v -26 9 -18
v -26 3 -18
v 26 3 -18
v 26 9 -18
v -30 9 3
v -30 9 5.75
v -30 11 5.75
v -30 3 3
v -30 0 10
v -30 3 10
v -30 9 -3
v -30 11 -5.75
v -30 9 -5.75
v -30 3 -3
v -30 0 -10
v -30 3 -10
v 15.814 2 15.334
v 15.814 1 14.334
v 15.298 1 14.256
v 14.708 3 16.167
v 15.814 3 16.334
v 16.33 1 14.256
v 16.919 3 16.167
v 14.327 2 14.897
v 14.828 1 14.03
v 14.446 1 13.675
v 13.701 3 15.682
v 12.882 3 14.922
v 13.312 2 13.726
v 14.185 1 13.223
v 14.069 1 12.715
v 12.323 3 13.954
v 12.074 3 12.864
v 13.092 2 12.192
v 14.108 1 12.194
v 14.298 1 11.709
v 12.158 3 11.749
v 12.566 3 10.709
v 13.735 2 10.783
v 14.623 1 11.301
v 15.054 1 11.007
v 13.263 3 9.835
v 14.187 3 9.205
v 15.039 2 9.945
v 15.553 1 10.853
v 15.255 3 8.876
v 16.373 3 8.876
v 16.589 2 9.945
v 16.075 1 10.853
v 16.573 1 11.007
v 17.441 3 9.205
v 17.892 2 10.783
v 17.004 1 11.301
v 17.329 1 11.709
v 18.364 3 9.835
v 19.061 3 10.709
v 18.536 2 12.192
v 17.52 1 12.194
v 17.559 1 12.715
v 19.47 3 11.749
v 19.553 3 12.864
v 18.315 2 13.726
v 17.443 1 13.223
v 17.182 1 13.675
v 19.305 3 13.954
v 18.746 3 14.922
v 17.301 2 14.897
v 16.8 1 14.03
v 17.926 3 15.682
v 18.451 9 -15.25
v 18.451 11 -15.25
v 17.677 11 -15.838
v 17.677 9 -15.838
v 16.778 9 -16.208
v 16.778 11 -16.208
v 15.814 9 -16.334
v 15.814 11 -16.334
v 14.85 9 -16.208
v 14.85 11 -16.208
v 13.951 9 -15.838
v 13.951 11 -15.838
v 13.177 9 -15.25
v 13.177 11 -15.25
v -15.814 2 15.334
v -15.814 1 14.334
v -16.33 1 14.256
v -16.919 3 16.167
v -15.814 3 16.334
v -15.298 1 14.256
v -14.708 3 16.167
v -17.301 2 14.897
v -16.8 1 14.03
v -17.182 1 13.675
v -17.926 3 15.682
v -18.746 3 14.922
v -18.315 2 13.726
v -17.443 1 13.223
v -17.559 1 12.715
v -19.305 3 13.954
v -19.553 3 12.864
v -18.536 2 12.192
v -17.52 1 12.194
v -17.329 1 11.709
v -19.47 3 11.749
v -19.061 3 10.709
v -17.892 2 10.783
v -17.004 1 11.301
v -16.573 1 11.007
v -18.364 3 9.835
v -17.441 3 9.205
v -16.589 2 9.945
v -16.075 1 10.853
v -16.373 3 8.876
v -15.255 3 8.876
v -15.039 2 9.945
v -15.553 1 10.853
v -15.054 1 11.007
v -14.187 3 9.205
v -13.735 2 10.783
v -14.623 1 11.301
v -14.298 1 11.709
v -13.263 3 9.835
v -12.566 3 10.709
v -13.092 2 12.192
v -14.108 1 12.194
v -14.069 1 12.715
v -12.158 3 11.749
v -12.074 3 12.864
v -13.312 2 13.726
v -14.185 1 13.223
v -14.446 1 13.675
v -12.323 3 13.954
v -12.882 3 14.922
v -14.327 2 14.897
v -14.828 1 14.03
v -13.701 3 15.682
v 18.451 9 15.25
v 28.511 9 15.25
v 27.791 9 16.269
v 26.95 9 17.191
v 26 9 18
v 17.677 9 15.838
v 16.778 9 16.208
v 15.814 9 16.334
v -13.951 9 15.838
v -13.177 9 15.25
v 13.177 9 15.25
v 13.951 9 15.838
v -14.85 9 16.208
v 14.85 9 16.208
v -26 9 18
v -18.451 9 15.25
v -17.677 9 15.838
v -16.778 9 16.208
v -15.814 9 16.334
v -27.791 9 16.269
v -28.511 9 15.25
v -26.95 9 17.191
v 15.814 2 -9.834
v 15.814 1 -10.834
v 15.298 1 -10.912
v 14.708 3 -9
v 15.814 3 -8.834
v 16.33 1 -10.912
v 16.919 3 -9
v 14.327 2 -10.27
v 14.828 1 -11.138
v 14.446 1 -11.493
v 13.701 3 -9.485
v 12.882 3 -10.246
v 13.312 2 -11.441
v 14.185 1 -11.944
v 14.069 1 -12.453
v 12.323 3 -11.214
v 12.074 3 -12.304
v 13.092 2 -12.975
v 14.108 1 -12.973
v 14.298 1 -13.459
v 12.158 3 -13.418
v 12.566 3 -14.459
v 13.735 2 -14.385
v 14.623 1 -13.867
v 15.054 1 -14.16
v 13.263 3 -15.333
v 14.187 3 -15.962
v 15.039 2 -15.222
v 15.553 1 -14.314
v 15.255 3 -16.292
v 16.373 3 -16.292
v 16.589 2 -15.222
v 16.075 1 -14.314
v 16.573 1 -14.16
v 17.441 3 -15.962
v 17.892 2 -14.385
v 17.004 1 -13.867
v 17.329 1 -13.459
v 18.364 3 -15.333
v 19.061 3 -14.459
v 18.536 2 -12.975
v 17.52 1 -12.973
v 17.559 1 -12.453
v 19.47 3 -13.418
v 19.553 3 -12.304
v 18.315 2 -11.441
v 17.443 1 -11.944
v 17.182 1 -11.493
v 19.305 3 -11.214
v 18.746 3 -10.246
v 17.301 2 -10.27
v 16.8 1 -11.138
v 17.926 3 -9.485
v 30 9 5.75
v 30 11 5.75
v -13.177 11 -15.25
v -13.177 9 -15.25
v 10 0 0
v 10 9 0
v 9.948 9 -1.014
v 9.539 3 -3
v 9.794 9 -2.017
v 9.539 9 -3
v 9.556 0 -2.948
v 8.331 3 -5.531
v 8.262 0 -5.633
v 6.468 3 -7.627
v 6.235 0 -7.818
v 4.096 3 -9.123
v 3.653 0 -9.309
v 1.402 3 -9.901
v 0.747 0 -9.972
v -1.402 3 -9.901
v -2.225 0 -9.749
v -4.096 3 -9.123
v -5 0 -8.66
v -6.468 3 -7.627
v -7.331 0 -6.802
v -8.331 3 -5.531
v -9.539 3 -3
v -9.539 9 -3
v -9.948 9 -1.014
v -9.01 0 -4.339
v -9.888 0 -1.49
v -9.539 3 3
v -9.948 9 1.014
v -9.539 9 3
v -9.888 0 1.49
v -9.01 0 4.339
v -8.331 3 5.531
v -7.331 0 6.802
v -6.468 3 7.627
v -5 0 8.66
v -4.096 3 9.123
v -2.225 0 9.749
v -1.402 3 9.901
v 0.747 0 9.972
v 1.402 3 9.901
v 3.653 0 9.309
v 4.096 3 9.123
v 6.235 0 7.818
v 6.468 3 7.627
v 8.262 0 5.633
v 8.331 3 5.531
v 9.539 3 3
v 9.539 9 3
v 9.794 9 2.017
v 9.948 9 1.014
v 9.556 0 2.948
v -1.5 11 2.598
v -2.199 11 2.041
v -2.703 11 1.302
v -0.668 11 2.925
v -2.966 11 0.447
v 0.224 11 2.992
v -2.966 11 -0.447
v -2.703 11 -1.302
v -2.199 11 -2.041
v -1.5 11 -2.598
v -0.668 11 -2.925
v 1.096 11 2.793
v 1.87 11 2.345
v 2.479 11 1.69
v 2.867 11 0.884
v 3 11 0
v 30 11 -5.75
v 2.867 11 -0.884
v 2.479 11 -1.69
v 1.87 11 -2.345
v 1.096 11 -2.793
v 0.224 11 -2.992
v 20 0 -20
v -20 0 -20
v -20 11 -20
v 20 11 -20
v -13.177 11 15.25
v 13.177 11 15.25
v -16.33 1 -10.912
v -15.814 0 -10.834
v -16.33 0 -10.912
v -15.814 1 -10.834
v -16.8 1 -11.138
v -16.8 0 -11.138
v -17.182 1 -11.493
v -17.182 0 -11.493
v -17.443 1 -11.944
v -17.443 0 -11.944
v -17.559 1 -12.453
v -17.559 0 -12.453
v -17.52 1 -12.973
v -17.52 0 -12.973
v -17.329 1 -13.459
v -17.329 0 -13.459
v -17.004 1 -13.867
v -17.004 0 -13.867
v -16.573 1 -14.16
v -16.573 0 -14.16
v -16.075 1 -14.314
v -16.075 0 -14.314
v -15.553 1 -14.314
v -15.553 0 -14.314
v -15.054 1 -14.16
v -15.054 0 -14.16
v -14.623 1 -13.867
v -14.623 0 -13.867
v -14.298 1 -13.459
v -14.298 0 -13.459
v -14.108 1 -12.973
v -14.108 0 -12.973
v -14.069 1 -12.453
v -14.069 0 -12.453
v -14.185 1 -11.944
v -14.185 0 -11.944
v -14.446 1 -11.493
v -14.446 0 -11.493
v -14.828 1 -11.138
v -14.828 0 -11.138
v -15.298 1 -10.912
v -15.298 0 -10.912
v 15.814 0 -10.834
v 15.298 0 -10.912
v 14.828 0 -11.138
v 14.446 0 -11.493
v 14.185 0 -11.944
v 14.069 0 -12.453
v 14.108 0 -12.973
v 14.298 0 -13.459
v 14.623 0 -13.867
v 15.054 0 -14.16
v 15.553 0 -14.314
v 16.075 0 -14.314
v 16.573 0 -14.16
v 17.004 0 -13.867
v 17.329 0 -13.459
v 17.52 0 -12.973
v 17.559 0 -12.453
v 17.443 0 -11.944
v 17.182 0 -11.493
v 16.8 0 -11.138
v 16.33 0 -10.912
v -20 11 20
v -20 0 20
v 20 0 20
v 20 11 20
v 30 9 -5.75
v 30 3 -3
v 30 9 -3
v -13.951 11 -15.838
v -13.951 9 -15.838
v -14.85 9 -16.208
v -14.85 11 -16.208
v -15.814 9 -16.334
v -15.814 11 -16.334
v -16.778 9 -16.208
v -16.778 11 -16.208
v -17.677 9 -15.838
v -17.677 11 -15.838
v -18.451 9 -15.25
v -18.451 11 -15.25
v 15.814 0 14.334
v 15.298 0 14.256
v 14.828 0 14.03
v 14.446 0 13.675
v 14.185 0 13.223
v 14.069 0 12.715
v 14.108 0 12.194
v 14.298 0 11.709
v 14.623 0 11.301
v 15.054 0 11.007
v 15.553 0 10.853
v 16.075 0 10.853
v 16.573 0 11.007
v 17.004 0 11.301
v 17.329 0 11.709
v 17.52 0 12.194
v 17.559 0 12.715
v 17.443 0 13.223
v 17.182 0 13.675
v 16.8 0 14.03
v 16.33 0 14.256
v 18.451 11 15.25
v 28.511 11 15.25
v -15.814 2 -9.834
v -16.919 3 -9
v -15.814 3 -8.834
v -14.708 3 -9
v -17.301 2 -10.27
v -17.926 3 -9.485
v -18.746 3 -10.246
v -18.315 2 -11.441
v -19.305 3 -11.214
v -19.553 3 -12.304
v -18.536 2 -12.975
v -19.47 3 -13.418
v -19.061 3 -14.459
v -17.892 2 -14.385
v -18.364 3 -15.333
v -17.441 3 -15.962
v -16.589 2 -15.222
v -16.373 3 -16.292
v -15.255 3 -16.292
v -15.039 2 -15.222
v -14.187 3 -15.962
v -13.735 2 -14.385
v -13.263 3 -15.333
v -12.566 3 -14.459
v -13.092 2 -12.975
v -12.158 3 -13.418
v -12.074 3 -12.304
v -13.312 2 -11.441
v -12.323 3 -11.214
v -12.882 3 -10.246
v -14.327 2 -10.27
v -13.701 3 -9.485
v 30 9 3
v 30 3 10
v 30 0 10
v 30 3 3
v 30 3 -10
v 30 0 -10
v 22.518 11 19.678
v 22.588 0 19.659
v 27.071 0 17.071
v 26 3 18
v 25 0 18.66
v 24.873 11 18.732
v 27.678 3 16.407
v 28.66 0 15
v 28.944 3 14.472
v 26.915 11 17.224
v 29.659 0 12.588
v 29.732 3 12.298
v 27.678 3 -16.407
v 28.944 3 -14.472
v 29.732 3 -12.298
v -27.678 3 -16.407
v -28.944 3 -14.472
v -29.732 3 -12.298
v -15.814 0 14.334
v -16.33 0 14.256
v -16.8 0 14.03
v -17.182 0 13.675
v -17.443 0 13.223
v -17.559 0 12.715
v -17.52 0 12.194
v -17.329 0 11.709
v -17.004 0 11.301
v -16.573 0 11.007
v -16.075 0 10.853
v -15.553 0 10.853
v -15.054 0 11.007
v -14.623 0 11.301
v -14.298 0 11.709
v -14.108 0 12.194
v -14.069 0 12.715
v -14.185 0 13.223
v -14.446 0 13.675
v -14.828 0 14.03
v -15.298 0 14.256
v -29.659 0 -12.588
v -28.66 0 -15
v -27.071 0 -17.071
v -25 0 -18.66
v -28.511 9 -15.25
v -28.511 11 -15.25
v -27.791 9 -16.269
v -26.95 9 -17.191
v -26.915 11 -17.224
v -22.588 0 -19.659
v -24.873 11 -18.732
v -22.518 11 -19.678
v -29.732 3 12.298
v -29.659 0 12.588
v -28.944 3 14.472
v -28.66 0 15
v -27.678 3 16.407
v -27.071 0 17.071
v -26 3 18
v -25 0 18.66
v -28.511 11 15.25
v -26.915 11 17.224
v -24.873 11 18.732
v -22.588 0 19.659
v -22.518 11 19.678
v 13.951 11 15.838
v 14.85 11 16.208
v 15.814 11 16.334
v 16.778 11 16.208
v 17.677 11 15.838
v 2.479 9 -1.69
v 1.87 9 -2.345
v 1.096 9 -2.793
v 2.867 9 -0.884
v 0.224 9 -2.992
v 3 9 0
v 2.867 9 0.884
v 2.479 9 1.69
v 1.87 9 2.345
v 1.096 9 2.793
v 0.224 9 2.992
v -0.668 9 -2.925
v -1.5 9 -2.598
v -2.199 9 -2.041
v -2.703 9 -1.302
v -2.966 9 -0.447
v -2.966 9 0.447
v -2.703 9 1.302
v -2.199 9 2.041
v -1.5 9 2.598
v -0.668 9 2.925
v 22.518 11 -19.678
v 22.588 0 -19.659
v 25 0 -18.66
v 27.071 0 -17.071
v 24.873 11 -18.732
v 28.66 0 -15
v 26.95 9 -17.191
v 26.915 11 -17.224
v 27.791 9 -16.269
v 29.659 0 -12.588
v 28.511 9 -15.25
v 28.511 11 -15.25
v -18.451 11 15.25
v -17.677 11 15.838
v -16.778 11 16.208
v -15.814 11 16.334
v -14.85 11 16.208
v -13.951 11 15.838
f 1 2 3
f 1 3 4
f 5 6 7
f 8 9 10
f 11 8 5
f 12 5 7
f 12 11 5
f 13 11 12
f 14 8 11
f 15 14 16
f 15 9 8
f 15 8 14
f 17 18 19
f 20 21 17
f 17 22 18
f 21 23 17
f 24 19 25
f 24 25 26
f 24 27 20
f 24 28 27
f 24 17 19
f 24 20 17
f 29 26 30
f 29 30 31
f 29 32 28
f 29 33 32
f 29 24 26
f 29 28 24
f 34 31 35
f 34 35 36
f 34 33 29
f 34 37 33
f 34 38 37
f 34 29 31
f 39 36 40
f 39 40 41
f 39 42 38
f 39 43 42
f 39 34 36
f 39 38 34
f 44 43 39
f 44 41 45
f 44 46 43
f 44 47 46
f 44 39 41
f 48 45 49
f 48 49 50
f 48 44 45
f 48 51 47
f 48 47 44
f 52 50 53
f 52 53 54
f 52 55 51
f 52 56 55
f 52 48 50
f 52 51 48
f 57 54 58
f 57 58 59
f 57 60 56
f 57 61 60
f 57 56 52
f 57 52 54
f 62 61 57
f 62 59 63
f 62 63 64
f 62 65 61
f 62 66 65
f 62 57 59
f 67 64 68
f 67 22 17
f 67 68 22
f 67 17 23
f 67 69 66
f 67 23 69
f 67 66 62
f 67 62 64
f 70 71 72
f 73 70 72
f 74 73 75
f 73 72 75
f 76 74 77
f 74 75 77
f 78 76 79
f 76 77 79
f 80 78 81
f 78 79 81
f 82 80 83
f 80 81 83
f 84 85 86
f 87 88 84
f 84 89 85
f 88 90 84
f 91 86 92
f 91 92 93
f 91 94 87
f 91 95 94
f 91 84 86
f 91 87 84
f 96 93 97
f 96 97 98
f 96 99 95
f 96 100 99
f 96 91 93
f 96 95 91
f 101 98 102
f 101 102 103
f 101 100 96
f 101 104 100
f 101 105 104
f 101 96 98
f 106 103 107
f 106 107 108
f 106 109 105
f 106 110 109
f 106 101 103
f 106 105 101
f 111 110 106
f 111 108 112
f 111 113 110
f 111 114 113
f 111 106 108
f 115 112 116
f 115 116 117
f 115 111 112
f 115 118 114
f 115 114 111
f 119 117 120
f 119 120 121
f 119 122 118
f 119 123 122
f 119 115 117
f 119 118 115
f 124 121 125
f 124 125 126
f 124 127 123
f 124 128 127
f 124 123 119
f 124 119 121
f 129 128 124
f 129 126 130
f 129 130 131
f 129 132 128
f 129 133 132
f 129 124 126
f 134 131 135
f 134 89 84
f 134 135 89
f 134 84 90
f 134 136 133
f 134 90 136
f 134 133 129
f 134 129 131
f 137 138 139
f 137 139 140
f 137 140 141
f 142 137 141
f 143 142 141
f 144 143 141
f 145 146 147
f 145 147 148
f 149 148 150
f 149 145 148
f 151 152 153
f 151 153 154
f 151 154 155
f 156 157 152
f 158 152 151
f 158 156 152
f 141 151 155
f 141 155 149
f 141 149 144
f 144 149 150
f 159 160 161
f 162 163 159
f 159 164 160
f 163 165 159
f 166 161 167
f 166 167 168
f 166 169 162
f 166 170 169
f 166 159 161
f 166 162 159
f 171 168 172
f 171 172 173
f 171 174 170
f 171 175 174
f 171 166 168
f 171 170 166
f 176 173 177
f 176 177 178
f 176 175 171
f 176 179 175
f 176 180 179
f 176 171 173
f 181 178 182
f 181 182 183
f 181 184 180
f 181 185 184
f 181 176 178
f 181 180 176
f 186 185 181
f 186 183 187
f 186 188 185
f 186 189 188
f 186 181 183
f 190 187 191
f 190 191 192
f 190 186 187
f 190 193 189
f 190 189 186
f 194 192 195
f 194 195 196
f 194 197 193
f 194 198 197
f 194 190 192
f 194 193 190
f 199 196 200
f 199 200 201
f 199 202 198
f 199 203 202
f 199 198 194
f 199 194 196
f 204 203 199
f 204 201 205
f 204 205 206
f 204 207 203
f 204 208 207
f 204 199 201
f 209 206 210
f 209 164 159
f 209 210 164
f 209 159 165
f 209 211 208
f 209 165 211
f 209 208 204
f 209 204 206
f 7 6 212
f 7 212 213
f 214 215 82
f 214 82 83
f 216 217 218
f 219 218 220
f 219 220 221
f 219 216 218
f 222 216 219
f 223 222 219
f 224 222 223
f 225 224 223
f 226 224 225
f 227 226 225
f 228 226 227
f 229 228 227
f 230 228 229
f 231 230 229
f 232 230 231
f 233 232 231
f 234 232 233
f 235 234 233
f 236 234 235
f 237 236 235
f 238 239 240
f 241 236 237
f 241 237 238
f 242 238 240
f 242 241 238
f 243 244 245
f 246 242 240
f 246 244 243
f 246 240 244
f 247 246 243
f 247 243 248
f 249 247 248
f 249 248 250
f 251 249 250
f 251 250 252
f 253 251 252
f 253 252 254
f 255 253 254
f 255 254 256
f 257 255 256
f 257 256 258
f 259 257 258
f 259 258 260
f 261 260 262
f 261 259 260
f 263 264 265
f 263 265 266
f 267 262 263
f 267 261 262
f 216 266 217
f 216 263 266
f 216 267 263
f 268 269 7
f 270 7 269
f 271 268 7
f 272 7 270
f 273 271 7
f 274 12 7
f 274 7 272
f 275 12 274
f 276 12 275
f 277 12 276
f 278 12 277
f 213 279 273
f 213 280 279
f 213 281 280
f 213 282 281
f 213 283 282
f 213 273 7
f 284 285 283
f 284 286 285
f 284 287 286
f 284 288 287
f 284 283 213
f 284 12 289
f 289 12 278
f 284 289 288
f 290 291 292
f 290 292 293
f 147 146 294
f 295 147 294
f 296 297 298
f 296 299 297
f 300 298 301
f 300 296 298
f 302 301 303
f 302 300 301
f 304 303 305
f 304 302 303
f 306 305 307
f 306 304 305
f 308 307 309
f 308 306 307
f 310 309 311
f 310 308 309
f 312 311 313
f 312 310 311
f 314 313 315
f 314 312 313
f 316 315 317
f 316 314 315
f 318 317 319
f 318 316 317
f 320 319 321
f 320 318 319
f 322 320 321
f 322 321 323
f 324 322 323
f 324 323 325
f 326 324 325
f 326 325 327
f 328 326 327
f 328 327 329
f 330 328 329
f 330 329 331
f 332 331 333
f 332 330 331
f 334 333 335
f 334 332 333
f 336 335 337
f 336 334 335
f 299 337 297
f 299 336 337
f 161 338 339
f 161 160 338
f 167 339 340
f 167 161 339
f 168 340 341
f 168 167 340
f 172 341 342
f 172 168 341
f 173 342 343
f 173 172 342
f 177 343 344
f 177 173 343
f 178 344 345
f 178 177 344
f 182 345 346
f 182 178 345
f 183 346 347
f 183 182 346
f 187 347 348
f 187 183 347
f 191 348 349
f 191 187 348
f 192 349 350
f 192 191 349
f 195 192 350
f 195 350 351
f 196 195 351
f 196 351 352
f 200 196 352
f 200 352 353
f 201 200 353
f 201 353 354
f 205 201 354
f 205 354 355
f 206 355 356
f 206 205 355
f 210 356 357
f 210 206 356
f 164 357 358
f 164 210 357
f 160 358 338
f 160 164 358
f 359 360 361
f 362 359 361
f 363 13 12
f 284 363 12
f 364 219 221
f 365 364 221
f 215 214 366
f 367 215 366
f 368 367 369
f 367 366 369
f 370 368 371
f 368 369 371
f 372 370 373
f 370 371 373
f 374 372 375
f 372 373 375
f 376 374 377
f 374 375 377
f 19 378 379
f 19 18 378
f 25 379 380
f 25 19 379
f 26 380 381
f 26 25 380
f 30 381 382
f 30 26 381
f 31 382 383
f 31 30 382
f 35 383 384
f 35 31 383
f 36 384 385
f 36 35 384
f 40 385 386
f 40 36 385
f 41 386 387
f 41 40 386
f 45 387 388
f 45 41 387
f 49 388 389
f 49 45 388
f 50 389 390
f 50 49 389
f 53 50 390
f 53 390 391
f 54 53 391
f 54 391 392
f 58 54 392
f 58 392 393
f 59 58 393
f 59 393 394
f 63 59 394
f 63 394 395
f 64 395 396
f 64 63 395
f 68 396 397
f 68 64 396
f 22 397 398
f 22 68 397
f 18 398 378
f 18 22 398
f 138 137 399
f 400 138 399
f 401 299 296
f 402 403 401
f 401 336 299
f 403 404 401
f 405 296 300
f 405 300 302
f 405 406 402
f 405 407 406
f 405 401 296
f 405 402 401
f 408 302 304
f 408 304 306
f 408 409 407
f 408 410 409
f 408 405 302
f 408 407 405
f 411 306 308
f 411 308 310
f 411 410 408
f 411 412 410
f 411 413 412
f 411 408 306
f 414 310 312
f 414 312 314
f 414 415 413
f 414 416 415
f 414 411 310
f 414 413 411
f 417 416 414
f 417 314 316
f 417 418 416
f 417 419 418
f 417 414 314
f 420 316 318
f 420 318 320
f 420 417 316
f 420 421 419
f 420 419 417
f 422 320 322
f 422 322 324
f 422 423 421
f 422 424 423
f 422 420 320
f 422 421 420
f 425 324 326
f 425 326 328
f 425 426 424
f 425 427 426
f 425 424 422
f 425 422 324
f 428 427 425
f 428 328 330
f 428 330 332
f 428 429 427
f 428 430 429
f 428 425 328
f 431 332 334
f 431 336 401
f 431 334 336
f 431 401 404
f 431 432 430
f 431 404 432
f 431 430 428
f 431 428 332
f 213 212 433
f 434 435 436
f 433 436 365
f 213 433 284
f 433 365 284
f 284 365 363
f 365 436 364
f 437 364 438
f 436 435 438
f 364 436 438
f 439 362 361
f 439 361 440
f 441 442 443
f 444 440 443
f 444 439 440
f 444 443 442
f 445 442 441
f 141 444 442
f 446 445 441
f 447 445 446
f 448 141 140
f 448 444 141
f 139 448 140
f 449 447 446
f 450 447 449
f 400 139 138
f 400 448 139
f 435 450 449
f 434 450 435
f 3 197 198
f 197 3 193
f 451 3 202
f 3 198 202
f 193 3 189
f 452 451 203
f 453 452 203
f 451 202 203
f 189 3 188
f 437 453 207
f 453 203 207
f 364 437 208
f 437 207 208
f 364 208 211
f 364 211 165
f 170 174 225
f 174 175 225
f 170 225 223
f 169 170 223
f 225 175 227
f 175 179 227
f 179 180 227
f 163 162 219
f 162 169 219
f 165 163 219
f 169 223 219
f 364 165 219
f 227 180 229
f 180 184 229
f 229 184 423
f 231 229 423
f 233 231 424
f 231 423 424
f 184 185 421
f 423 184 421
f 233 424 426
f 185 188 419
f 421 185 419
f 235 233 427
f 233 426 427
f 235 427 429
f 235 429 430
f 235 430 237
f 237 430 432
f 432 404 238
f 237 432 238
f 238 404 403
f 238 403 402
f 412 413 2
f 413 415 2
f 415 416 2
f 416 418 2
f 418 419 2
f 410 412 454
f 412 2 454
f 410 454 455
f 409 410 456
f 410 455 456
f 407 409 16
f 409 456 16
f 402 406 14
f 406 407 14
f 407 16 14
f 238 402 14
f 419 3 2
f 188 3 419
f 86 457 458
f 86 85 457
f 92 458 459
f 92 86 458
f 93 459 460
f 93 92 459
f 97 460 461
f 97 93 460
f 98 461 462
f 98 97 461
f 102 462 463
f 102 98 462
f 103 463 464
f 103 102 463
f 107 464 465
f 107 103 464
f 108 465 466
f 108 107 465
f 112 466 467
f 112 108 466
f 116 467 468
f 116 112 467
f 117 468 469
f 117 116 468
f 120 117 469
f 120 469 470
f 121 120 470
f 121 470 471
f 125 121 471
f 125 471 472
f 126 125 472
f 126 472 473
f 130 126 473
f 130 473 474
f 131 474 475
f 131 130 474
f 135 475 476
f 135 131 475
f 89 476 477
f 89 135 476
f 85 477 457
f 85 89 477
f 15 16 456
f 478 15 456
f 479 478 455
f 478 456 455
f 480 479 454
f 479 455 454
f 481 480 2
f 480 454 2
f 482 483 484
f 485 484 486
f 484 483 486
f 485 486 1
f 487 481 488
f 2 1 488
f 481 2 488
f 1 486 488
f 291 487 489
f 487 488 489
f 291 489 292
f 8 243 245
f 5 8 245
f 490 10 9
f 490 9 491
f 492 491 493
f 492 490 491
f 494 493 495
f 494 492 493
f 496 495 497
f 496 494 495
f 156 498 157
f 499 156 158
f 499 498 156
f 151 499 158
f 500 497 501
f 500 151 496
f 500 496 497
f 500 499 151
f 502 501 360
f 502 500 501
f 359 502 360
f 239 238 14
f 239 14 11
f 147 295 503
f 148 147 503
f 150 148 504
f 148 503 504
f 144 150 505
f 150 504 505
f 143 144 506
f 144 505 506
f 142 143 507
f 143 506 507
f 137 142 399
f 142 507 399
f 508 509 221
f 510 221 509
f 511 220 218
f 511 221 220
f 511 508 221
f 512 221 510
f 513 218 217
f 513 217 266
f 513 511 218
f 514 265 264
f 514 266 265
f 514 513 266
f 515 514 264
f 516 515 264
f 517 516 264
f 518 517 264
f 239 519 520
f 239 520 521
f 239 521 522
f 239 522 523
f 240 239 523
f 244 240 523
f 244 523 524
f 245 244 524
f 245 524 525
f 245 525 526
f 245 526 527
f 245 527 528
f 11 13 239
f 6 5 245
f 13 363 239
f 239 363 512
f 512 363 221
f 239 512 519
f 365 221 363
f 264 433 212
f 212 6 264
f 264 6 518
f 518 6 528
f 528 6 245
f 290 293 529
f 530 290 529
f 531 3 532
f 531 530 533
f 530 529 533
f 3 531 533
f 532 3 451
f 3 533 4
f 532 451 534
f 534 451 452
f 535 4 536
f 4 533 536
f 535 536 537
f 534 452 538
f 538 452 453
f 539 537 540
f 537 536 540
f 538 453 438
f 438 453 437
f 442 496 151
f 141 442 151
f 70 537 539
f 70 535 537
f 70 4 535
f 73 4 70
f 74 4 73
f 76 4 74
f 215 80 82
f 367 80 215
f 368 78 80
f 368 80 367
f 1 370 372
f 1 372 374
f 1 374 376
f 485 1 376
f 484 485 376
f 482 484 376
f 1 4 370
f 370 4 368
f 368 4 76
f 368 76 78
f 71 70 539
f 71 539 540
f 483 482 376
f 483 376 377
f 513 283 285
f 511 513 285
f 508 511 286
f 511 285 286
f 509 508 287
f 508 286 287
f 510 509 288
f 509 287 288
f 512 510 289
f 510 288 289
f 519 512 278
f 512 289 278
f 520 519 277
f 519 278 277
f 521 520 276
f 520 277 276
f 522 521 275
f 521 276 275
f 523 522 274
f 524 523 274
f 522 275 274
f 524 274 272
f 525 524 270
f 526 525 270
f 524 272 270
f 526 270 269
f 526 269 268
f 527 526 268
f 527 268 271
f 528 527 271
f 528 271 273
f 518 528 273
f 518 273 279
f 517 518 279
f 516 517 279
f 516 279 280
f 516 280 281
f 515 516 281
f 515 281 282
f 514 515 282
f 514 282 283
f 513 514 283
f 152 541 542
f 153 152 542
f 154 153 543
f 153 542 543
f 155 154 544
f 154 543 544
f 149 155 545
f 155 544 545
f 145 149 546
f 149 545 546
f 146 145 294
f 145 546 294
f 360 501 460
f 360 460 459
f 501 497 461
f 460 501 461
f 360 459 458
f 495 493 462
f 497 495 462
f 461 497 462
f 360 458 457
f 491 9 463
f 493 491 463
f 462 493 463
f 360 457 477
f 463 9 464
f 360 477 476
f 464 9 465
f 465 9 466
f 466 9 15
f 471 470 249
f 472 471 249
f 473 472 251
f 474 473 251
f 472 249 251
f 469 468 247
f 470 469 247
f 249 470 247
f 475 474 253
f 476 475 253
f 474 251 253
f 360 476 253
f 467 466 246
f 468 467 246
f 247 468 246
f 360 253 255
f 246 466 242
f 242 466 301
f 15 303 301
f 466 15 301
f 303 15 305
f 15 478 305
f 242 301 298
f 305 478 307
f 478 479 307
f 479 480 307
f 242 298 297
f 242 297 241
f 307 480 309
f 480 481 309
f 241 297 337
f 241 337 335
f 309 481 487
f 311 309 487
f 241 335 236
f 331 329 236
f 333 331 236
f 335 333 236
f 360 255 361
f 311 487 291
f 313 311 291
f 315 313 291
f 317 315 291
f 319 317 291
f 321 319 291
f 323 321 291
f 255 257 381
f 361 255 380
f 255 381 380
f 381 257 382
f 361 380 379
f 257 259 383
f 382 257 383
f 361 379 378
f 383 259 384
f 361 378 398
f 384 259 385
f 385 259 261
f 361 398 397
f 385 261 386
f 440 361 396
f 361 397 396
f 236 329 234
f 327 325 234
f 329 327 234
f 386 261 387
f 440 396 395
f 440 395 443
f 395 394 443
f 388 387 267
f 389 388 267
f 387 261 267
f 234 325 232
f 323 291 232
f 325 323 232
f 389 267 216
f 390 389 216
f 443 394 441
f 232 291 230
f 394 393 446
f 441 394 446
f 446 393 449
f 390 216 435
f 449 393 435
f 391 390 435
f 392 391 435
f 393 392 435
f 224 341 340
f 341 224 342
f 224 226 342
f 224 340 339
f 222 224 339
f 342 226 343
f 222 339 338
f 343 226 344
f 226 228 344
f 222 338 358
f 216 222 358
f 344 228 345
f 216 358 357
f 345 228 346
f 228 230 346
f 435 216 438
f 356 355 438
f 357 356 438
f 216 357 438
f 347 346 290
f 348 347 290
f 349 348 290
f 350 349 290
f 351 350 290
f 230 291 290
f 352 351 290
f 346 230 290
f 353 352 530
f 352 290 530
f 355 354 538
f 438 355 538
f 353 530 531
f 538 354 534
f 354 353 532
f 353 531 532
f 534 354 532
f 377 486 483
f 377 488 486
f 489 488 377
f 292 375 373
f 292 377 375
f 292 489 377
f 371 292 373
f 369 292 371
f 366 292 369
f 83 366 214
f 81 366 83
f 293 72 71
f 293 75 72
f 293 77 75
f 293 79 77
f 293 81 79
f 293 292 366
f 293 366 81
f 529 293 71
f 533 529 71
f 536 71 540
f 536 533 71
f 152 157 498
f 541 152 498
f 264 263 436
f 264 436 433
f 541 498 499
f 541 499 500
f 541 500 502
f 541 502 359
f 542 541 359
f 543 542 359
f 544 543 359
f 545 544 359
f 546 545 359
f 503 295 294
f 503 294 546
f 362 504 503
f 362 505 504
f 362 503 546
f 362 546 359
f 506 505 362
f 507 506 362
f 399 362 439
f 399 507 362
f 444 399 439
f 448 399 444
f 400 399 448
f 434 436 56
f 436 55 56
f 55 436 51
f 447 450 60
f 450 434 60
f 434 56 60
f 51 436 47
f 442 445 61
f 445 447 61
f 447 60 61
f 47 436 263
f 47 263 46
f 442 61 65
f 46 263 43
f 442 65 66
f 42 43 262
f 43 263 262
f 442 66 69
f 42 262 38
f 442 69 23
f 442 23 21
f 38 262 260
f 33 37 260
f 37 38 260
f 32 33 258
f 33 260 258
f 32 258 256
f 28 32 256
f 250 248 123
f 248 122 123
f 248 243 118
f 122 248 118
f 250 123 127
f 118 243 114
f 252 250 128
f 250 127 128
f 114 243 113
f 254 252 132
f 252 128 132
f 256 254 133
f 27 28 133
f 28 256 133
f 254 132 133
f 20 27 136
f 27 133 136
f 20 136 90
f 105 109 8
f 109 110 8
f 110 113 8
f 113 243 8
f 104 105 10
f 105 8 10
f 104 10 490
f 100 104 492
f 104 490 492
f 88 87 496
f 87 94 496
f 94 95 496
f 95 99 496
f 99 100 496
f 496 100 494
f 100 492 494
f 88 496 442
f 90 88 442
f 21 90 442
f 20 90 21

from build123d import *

# Parameters (mm, degrees)
SKETCH1_W                                    = 60
SKETCH1_H                                    = 40
BOSS_EXTRUDE1_DEPTH                          = 11
SKETCH3_W                                    = 15
SKETCH3_H                                    = 6
SKETCH3_W_2                                  = 9.5
SKETCH3_H_2                                  = 2
CUT_EXTRUDE10_DEPTH                          = 61
CSK_FOR_M3_HEX_SOCKET_COUNTERSUNK_CA_2_COUNT = 2
CSK_FOR_M3_HEX_SOCKET_COUNTERSUNK_CA_2_PITCH = 25.167603026
CSK_FOR_M3_HEX_SOCKET_COUNTERSUNK_CA_3_COUNT = 2
CSK_FOR_M3_HEX_SOCKET_COUNTERSUNK_CA_3_PITCH = 40.419124333
CSK_FOR_M3_HEX_SOCKET_COUNTERSUNK_CA_4_COUNT = 2
CSK_FOR_M3_HEX_SOCKET_COUNTERSUNK_CA_4_PITCH = 31.627478082
SKETCH1_6_R                                  = 10
CUT_EXTRUDE19_DEPTH                          = 9
CUT_EXTRUDE21_START                          = 11
SKETCH1_7_R                                  = 3
CUT_EXTRUDE21_DEPTH                          = 12
SKETCH8_R                                    = 3.75
CUT_EXTRUDE22_DEPTH                          = 2
FILLET1_R                                    = 10


with BuildPart() as part:
    # Sketch1 → Boss-Extrude1 (new body)
    with BuildSketch(Plane(origin=(0, 0, 0), x_dir=(1, 0, 0), z_dir=(0, 1, 0))):
        Rectangle(SKETCH1_W, SKETCH1_H)
    extrude(amount=BOSS_EXTRUDE1_DEPTH)

    # Sketch3 → Cut-Extrude10 (cut, through all)
    with BuildSketch(Plane.ZY.offset(30)):
        with Locations((10.5, 6)):
            Rectangle(SKETCH3_W, SKETCH3_H)
        with Locations((-10.5, 6)):
            Rectangle(SKETCH3_W, SKETCH3_H)
        with Locations((-10.5, 10)):
            Rectangle(SKETCH3_W_2, SKETCH3_H_2)
        with Locations((10.5, 10)):
            Rectangle(SKETCH3_W_2, SKETCH3_H_2)
    extrude(amount=-CUT_EXTRUDE10_DEPTH, mode=Mode.SUBTRACT)

    # Sketch7 → CSK for M3 Hex Socket Countersunk Cap Screw2 (revolve, cut)
    with BuildSketch(Plane(origin=(15.813739041, 3, -12.583801513), x_dir=(0, 0, 1), z_dir=(1, 0, 0))):
        Polygon((0, 0), (0, 3), (1.75, 3), (1.75, 2), (3.75, 0), align=None)
    csk_for_m3_hex_socket_countersunk_cap_sc = revolve(axis=Axis((15.813739041, 9.35, -12.583801513), (0, -1, 0)), mode=Mode.SUBTRACT)

    # CSK for M3 Hex Socket Countersunk Ca 2: CSK for M3 Hex Socket Countersunk Cap Screw2 ×2
    with Locations(*[(0, 0, i * CSK_FOR_M3_HEX_SOCKET_COUNTERSUNK_CA_2_PITCH) for i in range(1, CSK_FOR_M3_HEX_SOCKET_COUNTERSUNK_CA_2_COUNT)]):
        add(csk_for_m3_hex_socket_countersunk_cap_sc, mode=Mode.SUBTRACT)

    # CSK for M3 Hex Socket Countersunk Ca 3: CSK for M3 Hex Socket Countersunk Cap Screw2 ×2
    with Locations(*[Vector(-0.782487958, 0, 0.622665717) * (i * CSK_FOR_M3_HEX_SOCKET_COUNTERSUNK_CA_3_PITCH) for i in range(1, CSK_FOR_M3_HEX_SOCKET_COUNTERSUNK_CA_3_COUNT)]):
        add(csk_for_m3_hex_socket_countersunk_cap_sc, mode=Mode.SUBTRACT)

    # CSK for M3 Hex Socket Countersunk Ca 4: CSK for M3 Hex Socket Countersunk Cap Screw2 ×2
    with Locations(*[(-i * CSK_FOR_M3_HEX_SOCKET_COUNTERSUNK_CA_4_PITCH, 0, 0) for i in range(1, CSK_FOR_M3_HEX_SOCKET_COUNTERSUNK_CA_4_COUNT)]):
        add(csk_for_m3_hex_socket_countersunk_cap_sc, mode=Mode.SUBTRACT)

    # Sketch1<6> → Cut-Extrude19 (cut)
    with BuildSketch(Plane(origin=(0, 0, 0), x_dir=(1, 0, 0), z_dir=(0, 1, 0))):
        Circle(SKETCH1_6_R)
    extrude(amount=CUT_EXTRUDE19_DEPTH, mode=Mode.SUBTRACT)

    # Sketch1<7> → Cut-Extrude21 (cut, through all)
    with BuildSketch(Plane(origin=(0, 0, 0), x_dir=(1, 0, 0), z_dir=(0, 1, 0)).offset(CUT_EXTRUDE21_START)):
        Circle(SKETCH1_7_R)
    extrude(amount=-CUT_EXTRUDE21_DEPTH, mode=Mode.SUBTRACT)

    # Sketch8 → Cut-Extrude22 (cut)
    with BuildSketch(Plane(origin=(0, 11, 0), x_dir=(1, 0, 0), z_dir=(0, 1, 0))):
        with Locations((-15.813739041, -12.583801513)):
            Circle(SKETCH8_R)
        with Locations((15.813739041, -12.583801513)):
            Circle(SKETCH8_R)
        with Locations((15.813739041, 12.583801513)):
            Circle(SKETCH8_R)
        with Locations((-15.813739041, 12.583801513)):
            Circle(SKETCH8_R)
    extrude(amount=-CUT_EXTRUDE22_DEPTH, mode=Mode.SUBTRACT)

    # Fillet1
    fillet1_edges = [part.edges().sort_by_distance(p)[0] for p in [
        (30, 5.5, -20),
        (30, 5.5, 20),
        (-30, 5.5, 20),
        (-30, 5.5, -20),
    ]]
    fillet(fillet1_edges, radius=FILLET1_R)


solid = part.part
